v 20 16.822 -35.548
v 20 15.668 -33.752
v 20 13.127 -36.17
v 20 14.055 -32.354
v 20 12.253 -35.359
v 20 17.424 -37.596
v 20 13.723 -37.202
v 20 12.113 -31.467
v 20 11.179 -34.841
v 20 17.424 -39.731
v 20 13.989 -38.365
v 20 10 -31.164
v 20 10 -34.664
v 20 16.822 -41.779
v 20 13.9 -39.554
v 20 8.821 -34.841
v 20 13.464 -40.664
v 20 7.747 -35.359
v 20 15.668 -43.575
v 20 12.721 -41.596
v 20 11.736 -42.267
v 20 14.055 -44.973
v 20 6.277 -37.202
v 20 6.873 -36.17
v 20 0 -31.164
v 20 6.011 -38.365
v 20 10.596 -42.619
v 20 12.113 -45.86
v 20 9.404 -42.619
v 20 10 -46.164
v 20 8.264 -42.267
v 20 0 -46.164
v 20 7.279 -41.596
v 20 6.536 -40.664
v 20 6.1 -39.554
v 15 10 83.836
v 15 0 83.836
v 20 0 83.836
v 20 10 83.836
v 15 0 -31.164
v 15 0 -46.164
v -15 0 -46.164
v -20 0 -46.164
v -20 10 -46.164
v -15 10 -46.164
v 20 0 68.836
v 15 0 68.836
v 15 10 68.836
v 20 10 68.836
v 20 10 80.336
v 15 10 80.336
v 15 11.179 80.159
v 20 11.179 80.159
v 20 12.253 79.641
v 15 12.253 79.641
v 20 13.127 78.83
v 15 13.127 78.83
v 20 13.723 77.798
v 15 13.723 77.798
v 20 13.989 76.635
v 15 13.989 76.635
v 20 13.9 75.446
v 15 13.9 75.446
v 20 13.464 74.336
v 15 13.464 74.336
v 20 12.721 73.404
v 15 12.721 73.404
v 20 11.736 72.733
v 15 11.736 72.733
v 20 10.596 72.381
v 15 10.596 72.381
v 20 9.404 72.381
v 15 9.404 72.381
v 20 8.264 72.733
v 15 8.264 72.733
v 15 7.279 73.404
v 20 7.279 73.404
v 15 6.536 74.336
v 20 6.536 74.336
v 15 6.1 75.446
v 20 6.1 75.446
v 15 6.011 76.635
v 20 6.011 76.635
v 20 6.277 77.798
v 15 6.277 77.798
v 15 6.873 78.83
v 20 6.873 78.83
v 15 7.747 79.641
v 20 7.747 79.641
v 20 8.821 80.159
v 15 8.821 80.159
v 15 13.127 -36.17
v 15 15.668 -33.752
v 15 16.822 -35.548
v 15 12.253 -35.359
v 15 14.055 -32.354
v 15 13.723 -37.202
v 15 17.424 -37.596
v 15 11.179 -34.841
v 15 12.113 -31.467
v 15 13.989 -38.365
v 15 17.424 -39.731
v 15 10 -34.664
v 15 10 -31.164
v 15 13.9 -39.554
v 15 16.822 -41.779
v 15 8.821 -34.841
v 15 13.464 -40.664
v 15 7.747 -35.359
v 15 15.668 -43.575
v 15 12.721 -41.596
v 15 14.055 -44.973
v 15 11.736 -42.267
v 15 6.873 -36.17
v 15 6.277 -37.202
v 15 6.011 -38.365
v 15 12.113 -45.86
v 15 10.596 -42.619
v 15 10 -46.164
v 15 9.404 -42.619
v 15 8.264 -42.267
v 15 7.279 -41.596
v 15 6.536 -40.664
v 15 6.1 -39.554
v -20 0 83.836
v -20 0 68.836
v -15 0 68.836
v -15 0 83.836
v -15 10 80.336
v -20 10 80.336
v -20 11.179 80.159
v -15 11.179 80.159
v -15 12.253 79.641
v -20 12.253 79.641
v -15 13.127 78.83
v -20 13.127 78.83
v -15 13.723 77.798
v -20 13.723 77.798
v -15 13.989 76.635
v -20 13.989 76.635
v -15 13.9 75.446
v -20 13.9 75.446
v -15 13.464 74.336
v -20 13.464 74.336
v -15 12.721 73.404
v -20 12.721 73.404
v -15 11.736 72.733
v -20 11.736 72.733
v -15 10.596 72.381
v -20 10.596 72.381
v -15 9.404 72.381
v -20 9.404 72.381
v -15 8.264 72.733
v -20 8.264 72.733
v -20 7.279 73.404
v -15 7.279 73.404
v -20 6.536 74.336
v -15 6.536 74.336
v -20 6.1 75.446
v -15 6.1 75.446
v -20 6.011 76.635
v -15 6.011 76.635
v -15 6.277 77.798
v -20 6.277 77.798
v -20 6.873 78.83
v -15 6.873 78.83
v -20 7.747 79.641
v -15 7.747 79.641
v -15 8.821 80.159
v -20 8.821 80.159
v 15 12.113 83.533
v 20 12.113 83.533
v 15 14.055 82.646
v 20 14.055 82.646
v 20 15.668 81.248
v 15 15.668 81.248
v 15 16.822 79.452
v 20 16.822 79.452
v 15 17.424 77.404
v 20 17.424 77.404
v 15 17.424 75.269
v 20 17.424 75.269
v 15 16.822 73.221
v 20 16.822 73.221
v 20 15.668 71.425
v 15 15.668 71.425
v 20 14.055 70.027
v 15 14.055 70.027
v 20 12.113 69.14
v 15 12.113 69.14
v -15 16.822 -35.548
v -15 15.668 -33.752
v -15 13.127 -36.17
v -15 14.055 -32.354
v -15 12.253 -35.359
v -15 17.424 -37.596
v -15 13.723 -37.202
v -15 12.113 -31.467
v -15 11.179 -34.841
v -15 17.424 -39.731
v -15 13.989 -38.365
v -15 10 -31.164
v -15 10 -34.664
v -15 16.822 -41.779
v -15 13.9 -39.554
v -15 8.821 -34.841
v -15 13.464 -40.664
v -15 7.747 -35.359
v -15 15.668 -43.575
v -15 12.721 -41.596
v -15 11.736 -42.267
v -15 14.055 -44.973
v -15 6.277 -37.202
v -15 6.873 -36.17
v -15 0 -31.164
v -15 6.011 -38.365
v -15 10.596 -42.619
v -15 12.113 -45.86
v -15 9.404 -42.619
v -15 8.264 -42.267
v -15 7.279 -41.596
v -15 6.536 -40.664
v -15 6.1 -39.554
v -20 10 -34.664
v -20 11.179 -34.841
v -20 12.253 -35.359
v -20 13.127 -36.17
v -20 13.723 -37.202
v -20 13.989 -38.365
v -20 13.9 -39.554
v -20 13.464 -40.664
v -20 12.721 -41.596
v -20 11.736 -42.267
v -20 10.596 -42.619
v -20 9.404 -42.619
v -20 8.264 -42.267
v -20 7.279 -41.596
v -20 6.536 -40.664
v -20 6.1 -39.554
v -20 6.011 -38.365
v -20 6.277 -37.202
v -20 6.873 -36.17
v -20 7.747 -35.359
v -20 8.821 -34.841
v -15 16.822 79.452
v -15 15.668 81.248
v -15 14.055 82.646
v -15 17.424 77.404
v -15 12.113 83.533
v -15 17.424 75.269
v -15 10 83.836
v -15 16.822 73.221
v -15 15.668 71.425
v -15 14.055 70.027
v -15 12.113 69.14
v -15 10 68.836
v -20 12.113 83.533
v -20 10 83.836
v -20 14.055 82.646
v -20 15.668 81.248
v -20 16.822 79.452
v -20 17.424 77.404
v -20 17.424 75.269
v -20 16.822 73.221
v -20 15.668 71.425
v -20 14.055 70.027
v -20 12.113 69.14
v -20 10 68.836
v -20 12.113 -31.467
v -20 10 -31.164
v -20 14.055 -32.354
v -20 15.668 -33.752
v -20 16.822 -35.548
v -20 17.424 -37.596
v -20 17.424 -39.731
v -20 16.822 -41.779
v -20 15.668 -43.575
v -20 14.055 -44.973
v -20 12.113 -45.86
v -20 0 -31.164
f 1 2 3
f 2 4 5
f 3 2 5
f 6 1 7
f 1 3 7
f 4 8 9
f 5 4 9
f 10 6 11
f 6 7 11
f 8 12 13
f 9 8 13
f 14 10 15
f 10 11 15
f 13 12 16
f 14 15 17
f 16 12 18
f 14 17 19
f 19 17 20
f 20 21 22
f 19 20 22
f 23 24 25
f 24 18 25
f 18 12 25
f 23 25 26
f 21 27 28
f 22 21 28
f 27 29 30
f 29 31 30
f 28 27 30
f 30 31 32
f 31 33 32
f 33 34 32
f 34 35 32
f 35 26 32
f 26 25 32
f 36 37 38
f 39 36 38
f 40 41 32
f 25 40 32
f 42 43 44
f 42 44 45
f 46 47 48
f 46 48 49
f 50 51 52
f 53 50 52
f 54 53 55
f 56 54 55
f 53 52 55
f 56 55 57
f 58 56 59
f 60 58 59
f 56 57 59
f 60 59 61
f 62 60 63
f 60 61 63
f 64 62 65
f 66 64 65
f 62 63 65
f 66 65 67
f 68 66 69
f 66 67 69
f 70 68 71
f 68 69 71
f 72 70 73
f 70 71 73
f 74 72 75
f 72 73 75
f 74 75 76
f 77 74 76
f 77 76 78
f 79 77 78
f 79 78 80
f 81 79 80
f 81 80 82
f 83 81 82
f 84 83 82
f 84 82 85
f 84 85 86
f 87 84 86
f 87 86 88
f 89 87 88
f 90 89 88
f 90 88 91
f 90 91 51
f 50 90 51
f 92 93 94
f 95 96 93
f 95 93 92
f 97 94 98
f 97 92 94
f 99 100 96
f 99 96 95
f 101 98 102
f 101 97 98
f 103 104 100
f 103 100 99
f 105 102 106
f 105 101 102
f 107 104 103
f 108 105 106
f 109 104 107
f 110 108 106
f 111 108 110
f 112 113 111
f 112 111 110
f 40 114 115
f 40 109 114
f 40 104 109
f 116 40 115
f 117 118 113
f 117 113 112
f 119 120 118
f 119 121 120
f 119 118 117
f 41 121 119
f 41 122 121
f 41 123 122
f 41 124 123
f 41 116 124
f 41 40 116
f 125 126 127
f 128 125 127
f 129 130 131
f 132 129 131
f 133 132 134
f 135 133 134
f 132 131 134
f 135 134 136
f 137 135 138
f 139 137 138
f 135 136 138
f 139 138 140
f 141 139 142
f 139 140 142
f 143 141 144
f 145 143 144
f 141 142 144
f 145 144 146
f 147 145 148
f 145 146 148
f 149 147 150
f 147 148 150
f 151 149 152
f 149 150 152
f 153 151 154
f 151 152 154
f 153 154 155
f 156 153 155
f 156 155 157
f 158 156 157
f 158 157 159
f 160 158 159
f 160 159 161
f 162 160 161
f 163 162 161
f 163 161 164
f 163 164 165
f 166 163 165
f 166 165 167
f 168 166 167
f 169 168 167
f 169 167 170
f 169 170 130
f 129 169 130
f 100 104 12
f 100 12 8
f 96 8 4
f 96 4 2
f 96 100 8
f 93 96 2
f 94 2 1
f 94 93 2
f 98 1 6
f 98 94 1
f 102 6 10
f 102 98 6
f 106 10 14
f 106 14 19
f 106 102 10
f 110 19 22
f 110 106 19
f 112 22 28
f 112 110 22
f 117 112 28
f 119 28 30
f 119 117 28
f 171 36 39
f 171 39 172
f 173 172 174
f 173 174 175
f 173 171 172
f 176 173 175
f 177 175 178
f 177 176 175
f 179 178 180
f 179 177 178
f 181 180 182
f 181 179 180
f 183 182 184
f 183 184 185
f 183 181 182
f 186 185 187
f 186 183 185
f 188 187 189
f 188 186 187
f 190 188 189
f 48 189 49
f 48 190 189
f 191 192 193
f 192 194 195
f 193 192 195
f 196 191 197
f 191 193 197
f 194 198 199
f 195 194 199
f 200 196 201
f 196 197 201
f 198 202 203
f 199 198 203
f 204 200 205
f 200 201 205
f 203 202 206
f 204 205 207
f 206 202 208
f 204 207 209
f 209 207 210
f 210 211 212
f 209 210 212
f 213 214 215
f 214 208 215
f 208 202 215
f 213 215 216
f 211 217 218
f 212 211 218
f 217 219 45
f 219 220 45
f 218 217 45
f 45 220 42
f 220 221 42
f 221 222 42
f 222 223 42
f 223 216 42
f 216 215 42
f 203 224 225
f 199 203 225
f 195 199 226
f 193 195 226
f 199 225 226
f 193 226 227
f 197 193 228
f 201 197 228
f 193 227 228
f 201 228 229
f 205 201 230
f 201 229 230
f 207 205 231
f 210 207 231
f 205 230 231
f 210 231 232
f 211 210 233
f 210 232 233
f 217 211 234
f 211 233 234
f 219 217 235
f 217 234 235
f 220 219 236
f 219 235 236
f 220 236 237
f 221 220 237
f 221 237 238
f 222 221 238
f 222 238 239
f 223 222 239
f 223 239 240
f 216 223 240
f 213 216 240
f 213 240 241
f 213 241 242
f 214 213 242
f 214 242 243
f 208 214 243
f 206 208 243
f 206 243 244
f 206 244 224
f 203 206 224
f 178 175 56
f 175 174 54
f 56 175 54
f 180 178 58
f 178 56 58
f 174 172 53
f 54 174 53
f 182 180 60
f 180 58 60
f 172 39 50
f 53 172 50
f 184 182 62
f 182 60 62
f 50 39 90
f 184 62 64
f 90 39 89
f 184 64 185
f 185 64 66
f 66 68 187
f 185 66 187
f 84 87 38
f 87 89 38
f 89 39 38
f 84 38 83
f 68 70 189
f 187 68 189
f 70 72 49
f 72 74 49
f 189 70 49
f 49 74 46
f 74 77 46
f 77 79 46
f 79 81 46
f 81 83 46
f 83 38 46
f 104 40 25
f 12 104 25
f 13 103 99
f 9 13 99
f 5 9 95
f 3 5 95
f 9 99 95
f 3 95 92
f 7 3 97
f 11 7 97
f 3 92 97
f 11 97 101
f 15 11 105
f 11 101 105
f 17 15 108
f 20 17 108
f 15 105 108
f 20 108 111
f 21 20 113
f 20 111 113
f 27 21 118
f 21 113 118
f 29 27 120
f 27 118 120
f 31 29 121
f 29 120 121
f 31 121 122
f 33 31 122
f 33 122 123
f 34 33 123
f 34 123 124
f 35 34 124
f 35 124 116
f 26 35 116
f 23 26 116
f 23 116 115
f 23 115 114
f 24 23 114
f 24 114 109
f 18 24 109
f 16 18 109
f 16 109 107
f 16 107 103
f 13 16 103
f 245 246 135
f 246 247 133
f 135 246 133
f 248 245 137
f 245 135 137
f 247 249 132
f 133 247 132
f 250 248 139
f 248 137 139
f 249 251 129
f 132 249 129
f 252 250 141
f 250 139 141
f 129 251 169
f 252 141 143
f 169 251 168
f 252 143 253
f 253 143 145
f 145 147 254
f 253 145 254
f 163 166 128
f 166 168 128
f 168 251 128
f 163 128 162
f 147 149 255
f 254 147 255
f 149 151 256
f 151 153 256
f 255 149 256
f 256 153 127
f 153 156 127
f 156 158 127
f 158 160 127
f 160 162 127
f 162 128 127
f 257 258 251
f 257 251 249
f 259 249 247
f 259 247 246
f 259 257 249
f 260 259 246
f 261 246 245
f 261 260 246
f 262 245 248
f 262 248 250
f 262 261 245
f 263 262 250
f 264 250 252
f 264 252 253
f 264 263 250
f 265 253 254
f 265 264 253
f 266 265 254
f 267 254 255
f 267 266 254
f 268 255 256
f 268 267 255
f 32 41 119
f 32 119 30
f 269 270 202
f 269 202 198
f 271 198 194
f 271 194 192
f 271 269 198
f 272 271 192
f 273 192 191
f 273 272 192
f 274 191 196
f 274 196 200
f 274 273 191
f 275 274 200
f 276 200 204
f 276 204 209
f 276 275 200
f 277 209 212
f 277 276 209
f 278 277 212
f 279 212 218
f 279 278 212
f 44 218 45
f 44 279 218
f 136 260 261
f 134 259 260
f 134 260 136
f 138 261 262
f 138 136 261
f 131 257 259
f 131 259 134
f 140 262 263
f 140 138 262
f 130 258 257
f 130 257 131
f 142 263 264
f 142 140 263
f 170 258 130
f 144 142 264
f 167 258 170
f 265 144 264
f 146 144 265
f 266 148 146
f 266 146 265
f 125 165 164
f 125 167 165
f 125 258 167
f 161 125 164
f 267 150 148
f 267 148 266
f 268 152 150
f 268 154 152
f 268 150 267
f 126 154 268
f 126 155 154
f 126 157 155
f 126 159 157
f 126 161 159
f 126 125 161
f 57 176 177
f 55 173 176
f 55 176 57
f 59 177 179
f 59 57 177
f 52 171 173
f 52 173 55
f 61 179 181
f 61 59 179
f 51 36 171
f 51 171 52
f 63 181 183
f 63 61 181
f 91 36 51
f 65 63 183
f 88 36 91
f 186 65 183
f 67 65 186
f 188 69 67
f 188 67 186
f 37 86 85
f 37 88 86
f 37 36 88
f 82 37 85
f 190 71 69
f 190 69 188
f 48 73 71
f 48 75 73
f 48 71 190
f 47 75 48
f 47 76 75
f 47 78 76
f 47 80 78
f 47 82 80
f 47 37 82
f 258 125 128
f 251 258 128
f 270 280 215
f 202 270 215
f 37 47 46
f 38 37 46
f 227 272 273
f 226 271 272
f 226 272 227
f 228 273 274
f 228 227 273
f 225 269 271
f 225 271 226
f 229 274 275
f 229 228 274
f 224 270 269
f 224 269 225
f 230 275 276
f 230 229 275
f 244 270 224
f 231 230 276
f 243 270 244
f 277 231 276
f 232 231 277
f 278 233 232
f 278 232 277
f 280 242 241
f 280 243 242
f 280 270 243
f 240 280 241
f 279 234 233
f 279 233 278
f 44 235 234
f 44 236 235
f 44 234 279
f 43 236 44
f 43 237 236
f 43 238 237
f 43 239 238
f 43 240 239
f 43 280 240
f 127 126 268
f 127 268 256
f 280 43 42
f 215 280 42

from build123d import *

# Parameters (mm, degrees)
SKETCH1_W             = 5
SKETCH1_H             = 15
BOSS_EXTRUDE1_DEPTH   = 20
BOSS_EXTRUDE1_2_DEPTH = 20
BOSS_EXTRUDE1_3_DEPTH = 20
BOSS_EXTRUDE1_4_DEPTH = 20
SKETCH2_R             = 4
CUT_EXTRUDE1_DEPTH    = 41


with BuildPart() as part:
    # Sketch1 → Boss-Extrude1 (new body)
    with BuildSketch(Plane(origin=(0, 0, 0), x_dir=(1, 0, 0), z_dir=(0, 1, 0))):
        with Locations((17.5, -76.336474884)):
            Rectangle(SKETCH1_W, SKETCH1_H)
    extrude(amount=BOSS_EXTRUDE1_DEPTH)


with BuildPart() as body_2:
    # Sketch1 → Boss-Extrude1 2 (new body)
    with BuildSketch(Plane(origin=(0, 0, 0), x_dir=(1, 0, 0), z_dir=(0, 1, 0))):
        with Locations((-17.5, -76.336474884)):
            Rectangle(SKETCH1_W, SKETCH1_H)
    extrude(amount=BOSS_EXTRUDE1_2_DEPTH)


with BuildPart() as body_3:
    # Sketch1 → Boss-Extrude1 3 (new body)
    with BuildSketch(Plane(origin=(0, 0, 0), x_dir=(1, 0, 0), z_dir=(0, 1, 0))):
        with Locations((-17.5, 38.663525116)):
            Rectangle(SKETCH1_W, SKETCH1_H)
    extrude(amount=BOSS_EXTRUDE1_3_DEPTH)


with BuildPart() as body_4:
    # Sketch1 → Boss-Extrude1 4 (new body)
    with BuildSketch(Plane(origin=(0, 0, 0), x_dir=(1, 0, 0), z_dir=(0, 1, 0))):
        with Locations((17.5, 38.663525116)):
            Rectangle(SKETCH1_W, SKETCH1_H)
    extrude(amount=BOSS_EXTRUDE1_4_DEPTH)


with BuildPart() as cut_extrude1_tool:
    # Sketch2 → Cut-Extrude1 (new body, through all)
    with BuildSketch(Plane.ZY.offset(20)):
        with Locations((-38.663525116, 10)):
            Circle(SKETCH2_R)
        with Locations((76.336474884, 10)):
            Circle(SKETCH2_R)
        with BuildLine():
            Line((-46.163525116, 10), (-46.163525116, 20))
            Line((-46.163525116, 20), (-31.163525116, 20))
            Line((-31.163525116, 20), (-31.163525116, 10))
            ThreePointArc((-31.163525116, 10), (-38.663525116, 17.5), (-46.163525116, 10))
        make_face()
        with BuildLine():
            Line((68.836474884, 10), (68.836474884, 20))
            Line((68.836474884, 20), (83.836474884, 20))
            Line((83.836474884, 20), (83.836474884, 10))
            ThreePointArc((83.836474884, 10), (76.336474884, 17.5), (68.836474884, 10))
        make_face()
    extrude(amount=-CUT_EXTRUDE1_DEPTH)


with BuildPart() as part_1:
    add(part.part)

    # Cut-Extrude1: cut by cut_extrude1_tool
    add(cut_extrude1_tool.part, mode=Mode.SUBTRACT)


with BuildPart() as body_2_1:
    add(body_2.part)

    # Cut-Extrude1: cut by cut_extrude1_tool
    add(cut_extrude1_tool.part, mode=Mode.SUBTRACT)


with BuildPart() as body_3_1:
    add(body_3.part)

    # Cut-Extrude1: cut by cut_extrude1_tool
    add(cut_extrude1_tool.part, mode=Mode.SUBTRACT)


with BuildPart() as body_4_1:
    add(body_4.part)

    # Cut-Extrude1: cut by cut_extrude1_tool
    add(cut_extrude1_tool.part, mode=Mode.SUBTRACT)


solid = Compound([part_1.part, body_2_1.part, body_3_1.part, body_4_1.part])
